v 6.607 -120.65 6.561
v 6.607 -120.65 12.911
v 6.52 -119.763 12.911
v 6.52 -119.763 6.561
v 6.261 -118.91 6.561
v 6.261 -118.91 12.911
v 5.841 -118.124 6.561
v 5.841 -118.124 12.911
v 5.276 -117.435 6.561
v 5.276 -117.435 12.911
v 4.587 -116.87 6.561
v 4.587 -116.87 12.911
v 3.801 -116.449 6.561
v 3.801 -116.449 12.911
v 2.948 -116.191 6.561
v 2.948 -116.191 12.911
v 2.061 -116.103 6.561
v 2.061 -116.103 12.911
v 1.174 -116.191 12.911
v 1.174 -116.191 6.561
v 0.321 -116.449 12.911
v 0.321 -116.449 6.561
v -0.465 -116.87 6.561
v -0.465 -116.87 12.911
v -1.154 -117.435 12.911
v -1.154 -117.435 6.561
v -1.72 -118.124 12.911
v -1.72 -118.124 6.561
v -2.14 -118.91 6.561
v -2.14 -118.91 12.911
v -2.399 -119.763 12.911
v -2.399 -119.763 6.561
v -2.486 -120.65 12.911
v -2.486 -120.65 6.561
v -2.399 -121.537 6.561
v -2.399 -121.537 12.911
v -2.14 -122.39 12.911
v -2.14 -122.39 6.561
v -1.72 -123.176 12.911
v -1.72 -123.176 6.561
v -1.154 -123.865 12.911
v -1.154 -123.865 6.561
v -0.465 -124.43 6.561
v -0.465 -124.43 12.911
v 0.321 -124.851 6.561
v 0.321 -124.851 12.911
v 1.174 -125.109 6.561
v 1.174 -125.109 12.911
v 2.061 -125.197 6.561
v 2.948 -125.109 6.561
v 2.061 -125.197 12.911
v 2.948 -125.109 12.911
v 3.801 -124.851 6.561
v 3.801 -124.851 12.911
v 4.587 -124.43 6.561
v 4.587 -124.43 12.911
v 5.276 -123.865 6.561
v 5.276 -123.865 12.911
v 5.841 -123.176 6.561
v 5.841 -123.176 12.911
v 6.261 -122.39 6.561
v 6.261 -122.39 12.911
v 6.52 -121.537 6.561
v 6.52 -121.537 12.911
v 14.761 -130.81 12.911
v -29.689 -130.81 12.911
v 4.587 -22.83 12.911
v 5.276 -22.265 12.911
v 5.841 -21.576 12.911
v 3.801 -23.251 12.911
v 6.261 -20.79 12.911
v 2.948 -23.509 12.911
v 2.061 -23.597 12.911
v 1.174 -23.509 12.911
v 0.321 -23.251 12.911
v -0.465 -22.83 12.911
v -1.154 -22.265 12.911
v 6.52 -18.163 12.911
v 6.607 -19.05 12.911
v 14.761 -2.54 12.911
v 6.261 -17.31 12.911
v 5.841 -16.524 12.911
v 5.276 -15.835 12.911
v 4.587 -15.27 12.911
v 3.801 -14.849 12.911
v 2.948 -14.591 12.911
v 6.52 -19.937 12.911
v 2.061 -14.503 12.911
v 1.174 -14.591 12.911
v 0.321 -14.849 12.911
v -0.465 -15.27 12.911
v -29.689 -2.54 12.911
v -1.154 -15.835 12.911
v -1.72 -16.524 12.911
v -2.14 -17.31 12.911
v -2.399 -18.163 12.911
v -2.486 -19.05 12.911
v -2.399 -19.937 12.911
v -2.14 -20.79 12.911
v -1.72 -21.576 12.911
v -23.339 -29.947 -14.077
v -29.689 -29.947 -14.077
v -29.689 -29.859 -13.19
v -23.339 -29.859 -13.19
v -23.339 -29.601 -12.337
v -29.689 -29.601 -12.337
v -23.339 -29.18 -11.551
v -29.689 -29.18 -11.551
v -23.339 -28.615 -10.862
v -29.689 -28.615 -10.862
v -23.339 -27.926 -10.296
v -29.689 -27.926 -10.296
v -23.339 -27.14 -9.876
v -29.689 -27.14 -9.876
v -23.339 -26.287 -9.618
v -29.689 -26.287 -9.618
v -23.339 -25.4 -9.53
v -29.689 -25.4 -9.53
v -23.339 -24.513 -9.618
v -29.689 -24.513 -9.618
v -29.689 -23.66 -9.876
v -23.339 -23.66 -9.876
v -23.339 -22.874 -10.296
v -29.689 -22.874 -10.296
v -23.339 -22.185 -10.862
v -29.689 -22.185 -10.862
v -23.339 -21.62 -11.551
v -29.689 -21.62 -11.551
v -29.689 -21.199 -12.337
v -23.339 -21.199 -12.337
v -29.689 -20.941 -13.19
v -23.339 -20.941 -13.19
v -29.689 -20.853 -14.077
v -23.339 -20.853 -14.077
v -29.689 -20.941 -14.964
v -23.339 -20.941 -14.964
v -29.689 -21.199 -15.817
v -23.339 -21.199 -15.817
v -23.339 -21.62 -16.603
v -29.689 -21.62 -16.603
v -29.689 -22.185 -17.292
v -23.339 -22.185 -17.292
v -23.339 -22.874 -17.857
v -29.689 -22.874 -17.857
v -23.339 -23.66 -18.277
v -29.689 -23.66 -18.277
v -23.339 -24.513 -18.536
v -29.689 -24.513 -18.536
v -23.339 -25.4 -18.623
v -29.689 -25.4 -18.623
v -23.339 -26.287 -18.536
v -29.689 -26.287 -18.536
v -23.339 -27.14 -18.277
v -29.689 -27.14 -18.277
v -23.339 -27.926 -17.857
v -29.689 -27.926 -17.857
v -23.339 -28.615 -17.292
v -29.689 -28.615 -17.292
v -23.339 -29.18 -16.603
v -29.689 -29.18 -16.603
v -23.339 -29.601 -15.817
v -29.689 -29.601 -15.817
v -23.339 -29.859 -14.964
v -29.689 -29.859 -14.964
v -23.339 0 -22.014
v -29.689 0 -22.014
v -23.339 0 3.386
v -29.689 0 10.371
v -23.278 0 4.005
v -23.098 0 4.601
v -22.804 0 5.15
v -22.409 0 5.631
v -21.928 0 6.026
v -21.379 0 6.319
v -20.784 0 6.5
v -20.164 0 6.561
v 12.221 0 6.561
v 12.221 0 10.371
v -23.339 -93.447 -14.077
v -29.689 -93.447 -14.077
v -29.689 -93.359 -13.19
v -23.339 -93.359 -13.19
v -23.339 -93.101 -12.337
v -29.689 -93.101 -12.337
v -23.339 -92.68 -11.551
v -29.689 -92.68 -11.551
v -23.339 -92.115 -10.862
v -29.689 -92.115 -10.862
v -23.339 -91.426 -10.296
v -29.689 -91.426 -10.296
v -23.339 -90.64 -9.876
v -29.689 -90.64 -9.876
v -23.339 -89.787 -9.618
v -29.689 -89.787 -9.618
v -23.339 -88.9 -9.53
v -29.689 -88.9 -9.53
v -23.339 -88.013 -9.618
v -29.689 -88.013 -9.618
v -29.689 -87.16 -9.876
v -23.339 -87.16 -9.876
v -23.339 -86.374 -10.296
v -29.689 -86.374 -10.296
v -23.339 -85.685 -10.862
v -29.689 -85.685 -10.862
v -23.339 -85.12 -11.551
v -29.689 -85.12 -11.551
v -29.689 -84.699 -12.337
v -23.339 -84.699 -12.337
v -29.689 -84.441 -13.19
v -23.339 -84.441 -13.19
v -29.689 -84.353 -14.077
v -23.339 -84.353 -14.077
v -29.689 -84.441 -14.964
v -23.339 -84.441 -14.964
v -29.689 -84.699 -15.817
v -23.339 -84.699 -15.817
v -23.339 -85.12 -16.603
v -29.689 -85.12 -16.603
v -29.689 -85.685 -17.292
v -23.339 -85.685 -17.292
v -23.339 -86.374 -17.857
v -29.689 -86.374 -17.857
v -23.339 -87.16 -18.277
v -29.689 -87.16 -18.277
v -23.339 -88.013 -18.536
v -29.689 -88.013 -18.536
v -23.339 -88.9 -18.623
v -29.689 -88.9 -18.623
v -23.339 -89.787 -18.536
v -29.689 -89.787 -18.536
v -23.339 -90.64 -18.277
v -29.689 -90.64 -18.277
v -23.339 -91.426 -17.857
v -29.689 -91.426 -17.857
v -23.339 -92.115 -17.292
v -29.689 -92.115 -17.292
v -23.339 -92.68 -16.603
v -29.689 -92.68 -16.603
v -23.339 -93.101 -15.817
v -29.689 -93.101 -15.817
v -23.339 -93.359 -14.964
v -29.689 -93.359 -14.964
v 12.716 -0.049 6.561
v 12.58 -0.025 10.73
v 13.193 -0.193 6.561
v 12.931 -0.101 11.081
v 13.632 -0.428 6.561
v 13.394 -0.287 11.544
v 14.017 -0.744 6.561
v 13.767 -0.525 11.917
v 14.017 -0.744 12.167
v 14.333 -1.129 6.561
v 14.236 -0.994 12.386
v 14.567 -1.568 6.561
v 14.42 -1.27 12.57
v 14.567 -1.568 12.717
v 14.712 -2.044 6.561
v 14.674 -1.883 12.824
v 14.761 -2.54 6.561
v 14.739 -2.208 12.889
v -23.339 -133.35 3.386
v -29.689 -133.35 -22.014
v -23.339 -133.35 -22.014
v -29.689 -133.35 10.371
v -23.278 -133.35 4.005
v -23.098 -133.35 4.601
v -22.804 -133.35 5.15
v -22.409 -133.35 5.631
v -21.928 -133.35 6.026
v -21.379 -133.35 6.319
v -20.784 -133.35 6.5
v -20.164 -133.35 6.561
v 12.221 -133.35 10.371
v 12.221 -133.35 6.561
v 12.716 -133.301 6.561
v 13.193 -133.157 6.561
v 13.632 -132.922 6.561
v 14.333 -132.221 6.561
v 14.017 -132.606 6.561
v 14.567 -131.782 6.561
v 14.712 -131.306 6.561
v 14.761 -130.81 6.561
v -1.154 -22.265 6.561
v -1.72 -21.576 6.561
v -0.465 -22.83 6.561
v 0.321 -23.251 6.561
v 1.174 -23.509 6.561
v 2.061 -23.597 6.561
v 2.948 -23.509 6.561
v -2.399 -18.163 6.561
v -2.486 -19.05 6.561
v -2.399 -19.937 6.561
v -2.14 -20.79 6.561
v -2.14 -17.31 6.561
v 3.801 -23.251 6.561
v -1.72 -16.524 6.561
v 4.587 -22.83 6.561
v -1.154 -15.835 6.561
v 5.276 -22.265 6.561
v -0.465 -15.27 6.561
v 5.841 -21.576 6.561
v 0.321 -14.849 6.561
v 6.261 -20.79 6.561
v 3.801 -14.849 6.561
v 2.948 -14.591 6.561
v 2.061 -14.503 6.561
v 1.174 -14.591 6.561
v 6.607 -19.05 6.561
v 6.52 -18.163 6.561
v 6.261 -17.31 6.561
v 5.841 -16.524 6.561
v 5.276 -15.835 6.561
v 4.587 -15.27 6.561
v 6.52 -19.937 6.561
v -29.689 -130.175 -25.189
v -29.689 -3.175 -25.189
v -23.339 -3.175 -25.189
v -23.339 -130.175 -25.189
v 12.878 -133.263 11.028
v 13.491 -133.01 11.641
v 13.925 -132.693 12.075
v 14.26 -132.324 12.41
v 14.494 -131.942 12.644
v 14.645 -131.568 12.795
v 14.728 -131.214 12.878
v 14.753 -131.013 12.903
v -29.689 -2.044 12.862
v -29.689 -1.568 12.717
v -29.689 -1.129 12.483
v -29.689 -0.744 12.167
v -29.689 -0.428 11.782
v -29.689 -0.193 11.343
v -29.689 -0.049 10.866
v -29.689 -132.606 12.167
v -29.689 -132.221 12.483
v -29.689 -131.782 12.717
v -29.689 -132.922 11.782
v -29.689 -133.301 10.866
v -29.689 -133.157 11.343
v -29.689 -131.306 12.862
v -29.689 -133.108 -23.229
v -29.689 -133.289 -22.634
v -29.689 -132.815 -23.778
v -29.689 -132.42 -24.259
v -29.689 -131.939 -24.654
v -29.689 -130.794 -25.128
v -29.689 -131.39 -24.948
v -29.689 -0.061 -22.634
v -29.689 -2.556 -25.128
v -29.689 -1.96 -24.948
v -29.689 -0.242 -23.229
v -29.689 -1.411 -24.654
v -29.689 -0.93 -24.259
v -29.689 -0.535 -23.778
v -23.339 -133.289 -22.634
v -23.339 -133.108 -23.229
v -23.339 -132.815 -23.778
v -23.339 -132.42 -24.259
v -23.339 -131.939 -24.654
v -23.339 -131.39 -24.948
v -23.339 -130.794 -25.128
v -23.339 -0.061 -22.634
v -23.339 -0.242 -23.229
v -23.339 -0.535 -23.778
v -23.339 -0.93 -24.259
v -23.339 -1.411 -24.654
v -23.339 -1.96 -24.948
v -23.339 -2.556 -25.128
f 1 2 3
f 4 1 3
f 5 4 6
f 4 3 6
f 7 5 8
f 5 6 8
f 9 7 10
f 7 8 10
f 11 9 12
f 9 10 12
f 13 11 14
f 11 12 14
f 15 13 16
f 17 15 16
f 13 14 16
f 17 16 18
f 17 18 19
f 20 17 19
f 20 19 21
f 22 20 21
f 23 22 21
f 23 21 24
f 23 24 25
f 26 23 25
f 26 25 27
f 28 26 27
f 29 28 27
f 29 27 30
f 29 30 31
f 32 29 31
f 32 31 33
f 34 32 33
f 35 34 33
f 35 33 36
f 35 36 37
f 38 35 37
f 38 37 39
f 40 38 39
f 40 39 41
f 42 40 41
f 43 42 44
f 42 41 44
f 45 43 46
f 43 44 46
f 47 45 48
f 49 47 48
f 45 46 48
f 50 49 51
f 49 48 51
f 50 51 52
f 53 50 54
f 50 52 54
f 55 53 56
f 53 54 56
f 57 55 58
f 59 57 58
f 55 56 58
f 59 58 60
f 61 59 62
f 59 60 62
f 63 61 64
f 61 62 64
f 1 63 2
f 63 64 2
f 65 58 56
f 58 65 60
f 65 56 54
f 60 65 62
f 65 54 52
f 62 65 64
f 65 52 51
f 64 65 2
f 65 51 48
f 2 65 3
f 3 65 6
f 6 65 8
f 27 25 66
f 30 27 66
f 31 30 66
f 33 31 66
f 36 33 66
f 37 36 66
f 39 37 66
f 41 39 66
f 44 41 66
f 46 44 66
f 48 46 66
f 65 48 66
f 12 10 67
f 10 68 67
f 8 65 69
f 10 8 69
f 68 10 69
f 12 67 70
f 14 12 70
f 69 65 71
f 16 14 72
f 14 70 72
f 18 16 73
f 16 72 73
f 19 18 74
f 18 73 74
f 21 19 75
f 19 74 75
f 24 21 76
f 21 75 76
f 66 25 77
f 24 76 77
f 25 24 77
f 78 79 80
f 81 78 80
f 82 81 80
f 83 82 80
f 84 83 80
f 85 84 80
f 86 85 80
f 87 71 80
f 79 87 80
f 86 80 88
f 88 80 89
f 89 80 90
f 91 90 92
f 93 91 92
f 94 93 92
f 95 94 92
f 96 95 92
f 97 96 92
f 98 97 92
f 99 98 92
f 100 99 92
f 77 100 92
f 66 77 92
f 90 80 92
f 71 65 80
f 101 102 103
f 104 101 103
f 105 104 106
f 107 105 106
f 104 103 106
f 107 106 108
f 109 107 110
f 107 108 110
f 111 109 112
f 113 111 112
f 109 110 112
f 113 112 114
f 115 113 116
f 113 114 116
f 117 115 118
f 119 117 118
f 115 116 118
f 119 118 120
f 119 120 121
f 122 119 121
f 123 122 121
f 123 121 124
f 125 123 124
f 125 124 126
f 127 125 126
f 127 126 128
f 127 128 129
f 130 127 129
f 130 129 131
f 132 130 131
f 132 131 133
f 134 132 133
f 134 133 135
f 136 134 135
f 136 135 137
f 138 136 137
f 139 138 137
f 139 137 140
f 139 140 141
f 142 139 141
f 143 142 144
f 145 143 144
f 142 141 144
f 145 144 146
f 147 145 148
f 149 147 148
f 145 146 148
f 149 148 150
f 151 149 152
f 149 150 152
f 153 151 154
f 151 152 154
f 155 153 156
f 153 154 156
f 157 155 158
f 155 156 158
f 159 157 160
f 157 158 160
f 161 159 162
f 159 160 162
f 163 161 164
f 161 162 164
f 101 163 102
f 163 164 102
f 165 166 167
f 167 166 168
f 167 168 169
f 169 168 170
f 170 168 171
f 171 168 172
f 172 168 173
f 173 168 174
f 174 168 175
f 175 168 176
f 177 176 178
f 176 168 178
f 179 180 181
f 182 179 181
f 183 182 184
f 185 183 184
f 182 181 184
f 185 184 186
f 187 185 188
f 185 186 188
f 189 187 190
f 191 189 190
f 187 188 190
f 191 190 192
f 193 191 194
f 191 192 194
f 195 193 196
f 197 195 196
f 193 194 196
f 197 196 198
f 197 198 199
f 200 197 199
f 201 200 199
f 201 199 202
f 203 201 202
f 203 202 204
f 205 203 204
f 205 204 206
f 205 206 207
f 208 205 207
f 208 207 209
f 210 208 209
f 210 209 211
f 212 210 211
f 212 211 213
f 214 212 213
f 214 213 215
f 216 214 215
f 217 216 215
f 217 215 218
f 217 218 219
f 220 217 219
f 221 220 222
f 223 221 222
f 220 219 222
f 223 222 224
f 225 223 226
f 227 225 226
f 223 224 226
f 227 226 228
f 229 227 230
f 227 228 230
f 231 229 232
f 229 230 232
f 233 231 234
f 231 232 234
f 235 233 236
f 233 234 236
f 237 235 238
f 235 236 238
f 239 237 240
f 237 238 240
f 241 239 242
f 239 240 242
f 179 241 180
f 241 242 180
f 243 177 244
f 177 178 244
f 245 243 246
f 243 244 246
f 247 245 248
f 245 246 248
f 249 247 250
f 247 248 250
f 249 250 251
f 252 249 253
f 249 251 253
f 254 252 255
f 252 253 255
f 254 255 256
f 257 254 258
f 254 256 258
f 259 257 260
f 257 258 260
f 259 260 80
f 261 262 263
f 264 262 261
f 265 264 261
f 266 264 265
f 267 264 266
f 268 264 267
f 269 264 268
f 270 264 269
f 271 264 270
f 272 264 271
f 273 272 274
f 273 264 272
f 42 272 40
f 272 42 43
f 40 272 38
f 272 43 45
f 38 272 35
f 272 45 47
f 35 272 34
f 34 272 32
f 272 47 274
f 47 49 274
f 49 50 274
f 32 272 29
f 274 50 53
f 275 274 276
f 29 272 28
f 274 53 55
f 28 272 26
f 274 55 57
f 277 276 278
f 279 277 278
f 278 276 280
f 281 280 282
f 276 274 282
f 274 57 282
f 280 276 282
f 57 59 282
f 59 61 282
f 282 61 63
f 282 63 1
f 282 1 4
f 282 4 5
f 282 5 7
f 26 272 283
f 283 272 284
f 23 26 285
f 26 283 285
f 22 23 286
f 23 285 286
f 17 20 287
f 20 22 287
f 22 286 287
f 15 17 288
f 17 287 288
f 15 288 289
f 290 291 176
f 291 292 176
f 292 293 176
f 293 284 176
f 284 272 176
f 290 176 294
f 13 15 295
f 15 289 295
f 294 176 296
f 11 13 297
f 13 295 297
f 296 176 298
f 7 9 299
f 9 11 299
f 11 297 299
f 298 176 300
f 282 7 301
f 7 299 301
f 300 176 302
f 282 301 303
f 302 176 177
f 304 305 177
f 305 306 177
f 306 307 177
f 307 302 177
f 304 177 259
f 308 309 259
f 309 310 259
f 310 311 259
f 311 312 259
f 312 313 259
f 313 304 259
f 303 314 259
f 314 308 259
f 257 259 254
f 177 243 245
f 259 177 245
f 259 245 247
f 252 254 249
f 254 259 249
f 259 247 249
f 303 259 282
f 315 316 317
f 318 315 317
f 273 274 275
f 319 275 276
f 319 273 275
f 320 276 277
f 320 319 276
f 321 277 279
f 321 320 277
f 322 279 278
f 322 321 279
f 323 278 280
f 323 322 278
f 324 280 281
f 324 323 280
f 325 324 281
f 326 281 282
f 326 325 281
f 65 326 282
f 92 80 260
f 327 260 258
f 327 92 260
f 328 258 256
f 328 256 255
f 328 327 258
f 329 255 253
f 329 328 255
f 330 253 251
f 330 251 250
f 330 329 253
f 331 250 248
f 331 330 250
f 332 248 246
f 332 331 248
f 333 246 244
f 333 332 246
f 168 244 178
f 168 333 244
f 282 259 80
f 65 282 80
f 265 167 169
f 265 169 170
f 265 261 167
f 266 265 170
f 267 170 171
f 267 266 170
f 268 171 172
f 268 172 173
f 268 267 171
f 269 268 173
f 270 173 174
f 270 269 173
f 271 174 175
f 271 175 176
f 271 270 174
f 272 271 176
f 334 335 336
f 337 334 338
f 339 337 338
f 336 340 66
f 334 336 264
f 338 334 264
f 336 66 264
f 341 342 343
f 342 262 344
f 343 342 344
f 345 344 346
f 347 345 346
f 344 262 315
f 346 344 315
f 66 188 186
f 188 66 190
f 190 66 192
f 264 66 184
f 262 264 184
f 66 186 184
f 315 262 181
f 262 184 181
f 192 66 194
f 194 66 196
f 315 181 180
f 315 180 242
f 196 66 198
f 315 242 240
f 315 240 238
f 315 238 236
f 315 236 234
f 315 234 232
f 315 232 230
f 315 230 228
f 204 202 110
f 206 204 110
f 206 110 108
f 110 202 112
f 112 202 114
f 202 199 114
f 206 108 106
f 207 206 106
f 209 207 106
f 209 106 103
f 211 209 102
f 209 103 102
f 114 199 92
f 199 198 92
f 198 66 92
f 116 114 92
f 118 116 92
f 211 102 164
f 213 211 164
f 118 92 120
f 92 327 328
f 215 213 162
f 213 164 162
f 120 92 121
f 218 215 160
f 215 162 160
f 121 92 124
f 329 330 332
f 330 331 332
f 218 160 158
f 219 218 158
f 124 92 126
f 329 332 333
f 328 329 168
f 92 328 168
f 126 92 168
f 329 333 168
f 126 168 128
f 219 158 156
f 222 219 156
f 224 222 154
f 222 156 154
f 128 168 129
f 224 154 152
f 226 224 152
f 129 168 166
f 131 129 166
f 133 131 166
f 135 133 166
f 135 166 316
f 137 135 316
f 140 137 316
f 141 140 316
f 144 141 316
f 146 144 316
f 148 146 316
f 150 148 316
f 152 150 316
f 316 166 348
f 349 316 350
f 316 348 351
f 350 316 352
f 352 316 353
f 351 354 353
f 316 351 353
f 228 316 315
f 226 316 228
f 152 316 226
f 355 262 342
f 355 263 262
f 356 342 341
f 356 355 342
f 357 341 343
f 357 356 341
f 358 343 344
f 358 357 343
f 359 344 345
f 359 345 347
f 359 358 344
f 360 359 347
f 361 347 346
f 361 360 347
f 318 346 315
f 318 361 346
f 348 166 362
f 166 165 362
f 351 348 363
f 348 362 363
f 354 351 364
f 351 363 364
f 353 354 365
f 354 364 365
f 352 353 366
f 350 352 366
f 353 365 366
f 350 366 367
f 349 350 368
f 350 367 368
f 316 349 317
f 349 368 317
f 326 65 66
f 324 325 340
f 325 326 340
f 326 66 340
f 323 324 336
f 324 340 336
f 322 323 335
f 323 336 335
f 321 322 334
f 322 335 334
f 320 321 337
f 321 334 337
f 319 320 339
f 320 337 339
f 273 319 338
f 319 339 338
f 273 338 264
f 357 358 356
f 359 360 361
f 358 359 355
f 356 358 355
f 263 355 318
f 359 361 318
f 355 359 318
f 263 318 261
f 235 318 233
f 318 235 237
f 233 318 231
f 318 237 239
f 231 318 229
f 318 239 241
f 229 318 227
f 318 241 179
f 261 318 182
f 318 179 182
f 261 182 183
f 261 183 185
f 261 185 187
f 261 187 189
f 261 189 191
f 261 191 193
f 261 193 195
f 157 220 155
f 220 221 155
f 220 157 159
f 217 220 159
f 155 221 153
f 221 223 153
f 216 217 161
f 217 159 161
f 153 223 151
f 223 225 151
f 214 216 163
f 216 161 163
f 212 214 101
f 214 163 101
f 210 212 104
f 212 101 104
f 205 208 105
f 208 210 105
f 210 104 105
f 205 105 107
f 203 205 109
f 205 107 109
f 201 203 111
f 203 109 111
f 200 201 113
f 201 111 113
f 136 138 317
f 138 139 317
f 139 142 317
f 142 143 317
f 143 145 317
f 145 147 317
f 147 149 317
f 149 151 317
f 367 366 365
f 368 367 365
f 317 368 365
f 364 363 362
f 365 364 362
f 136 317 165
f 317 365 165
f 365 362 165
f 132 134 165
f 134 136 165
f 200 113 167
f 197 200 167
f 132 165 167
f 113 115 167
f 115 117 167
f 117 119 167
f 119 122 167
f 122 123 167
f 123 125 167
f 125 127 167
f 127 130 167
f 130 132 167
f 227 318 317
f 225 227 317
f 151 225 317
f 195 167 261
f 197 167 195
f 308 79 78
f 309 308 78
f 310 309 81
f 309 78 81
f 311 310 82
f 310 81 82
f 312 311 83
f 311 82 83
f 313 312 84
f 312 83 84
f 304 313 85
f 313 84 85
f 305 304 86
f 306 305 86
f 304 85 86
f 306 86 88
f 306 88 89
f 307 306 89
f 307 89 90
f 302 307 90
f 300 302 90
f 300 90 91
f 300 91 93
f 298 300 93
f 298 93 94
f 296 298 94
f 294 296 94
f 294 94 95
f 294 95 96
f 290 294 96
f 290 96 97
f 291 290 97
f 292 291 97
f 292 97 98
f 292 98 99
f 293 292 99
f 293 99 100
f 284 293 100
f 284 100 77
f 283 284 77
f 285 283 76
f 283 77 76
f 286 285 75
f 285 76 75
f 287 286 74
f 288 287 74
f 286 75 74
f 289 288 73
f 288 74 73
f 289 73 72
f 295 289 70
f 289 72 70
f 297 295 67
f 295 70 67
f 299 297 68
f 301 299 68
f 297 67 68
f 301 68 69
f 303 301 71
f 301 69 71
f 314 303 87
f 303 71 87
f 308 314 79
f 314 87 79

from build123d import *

# Parameters (mm, degrees)
F1_DEPTH = 133.35
F2_R     = 4.5466
F3_DEPTH = 25.4
F4_R     = 4.5466
F5_DEPTH = 25.4
F6_R     = 2.54
F7_R     = 3.175


with BuildPart() as f1:
    # F0 (on Front) → F1 (new body)
    with BuildSketch(Plane.XZ):
        Polygon((-29.6893073604, 12.910717619), (-29.6893073604, -25.189282381), (-23.3393073604, -25.189282381), (-23.3393073604, 6.560717619), (14.7606926396, 6.560717619), (14.7606926396, 12.910717619), align=None)
    extrude(amount=F1_DEPTH)

    # F2 (on face) → F3 (cut)
    with BuildSketch(Plane(origin=(-29.6893073604, 0, 0), x_dir=(0, -1, 0), z_dir=(-1, 0, 0))):
        with Locations((25.4, -14.076782381)):
            Circle(F2_R)
        with Locations((88.9, -14.076782381)):
            Circle(F2_R)
    extrude(amount=-F3_DEPTH, mode=Mode.SUBTRACT)

    # F4 (on face) → F5 (cut)
    with BuildSketch(Plane.XY.offset(12.910717619)):
        with Locations((2.0606926396, -120.65)):
            Circle(F4_R)
        with Locations((2.0606926396, -19.05)):
            Circle(F4_R)
    extrude(amount=-F5_DEPTH, mode=Mode.SUBTRACT)

    # F6
    f6_edges = [f1.edges().sort_by_distance(p)[0] for p in [
        (14.760693, -133.35, 9.735718),
        (-7.464307, -133.35, 12.910718),
        (-7.464307, 0, 12.910718),
        (14.760693, 0, 9.735718),
    ]]
    fillet(f6_edges, radius=F6_R)

    # F7
    f7_edges = [f1.edges().sort_by_distance(p)[0] for p in [
        (-26.514307, -133.35, -25.189282),
        (-26.514307, 0, -25.189282),
        (-23.339307, -66.675, 6.560718),
    ]]
    fillet(f7_edges, radius=F7_R)


solid = f1.part
